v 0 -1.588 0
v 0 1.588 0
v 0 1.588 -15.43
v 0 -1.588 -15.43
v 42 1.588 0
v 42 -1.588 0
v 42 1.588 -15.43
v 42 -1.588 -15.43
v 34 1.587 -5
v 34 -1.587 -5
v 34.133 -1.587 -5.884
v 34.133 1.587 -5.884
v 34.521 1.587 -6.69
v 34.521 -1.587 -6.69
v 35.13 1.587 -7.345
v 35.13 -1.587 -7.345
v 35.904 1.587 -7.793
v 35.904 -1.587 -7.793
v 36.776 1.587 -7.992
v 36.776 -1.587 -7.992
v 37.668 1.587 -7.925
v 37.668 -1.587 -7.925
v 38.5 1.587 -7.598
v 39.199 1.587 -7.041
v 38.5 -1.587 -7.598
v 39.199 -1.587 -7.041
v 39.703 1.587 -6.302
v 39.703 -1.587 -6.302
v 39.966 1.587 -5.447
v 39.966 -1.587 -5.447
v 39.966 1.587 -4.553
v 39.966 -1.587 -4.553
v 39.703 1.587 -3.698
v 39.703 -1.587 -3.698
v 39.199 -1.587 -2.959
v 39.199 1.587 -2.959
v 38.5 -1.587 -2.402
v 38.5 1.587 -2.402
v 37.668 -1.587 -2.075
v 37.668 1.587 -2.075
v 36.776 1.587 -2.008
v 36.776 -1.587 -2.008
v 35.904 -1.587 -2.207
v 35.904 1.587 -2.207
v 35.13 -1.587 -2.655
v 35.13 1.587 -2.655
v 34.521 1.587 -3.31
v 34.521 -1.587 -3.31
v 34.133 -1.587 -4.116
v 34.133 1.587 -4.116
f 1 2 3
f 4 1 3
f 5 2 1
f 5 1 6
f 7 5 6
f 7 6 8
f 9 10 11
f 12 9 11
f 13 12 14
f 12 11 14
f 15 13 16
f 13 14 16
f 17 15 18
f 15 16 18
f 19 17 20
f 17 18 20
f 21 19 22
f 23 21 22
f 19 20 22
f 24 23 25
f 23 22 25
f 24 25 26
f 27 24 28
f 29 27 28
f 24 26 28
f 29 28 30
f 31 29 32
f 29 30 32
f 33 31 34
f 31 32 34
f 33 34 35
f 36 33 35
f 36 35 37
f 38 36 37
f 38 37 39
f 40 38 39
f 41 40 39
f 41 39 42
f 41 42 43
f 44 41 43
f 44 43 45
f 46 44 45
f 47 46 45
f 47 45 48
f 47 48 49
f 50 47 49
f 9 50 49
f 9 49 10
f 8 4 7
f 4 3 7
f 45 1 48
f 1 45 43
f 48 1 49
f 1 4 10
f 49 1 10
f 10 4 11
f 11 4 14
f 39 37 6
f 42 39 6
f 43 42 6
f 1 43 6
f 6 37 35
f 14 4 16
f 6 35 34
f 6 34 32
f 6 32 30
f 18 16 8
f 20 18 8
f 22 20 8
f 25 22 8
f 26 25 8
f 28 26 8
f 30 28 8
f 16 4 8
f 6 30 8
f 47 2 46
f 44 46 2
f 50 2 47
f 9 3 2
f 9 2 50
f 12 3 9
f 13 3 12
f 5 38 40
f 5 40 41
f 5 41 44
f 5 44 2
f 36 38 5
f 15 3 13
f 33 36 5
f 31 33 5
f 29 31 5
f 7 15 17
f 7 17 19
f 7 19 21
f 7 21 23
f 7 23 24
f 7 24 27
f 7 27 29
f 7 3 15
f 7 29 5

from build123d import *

# Parameters (mm, degrees)
SKETCH1_W             = 42
SKETCH1_H             = 15.43
BOSS_EXTRUDE1_DEPTH   = 1.5875
F_6_0MM_DOWEL_HOLE1_D = 6


with BuildPart() as part:
    # Sketch1 → Boss-Extrude1 (new body, symmetric)
    with BuildSketch(Plane(origin=(0, 0, 0), x_dir=(1, 0, 0), z_dir=(0, 1, 0))):
        with Locations((21, 7.715)):
            Rectangle(SKETCH1_W, SKETCH1_H)
    extrude(amount=BOSS_EXTRUDE1_DEPTH, both=True)

    # Ø6.0mm Dowel Hole1 (through all)
    with Locations(Plane(origin=(0, 1.5875, 0), x_dir=(1, 0, 0), z_dir=(0, 1, 0))):
        with Locations((37, 5)):
            Hole(F_6_0MM_DOWEL_HOLE1_D / 2)


solid = part.part
